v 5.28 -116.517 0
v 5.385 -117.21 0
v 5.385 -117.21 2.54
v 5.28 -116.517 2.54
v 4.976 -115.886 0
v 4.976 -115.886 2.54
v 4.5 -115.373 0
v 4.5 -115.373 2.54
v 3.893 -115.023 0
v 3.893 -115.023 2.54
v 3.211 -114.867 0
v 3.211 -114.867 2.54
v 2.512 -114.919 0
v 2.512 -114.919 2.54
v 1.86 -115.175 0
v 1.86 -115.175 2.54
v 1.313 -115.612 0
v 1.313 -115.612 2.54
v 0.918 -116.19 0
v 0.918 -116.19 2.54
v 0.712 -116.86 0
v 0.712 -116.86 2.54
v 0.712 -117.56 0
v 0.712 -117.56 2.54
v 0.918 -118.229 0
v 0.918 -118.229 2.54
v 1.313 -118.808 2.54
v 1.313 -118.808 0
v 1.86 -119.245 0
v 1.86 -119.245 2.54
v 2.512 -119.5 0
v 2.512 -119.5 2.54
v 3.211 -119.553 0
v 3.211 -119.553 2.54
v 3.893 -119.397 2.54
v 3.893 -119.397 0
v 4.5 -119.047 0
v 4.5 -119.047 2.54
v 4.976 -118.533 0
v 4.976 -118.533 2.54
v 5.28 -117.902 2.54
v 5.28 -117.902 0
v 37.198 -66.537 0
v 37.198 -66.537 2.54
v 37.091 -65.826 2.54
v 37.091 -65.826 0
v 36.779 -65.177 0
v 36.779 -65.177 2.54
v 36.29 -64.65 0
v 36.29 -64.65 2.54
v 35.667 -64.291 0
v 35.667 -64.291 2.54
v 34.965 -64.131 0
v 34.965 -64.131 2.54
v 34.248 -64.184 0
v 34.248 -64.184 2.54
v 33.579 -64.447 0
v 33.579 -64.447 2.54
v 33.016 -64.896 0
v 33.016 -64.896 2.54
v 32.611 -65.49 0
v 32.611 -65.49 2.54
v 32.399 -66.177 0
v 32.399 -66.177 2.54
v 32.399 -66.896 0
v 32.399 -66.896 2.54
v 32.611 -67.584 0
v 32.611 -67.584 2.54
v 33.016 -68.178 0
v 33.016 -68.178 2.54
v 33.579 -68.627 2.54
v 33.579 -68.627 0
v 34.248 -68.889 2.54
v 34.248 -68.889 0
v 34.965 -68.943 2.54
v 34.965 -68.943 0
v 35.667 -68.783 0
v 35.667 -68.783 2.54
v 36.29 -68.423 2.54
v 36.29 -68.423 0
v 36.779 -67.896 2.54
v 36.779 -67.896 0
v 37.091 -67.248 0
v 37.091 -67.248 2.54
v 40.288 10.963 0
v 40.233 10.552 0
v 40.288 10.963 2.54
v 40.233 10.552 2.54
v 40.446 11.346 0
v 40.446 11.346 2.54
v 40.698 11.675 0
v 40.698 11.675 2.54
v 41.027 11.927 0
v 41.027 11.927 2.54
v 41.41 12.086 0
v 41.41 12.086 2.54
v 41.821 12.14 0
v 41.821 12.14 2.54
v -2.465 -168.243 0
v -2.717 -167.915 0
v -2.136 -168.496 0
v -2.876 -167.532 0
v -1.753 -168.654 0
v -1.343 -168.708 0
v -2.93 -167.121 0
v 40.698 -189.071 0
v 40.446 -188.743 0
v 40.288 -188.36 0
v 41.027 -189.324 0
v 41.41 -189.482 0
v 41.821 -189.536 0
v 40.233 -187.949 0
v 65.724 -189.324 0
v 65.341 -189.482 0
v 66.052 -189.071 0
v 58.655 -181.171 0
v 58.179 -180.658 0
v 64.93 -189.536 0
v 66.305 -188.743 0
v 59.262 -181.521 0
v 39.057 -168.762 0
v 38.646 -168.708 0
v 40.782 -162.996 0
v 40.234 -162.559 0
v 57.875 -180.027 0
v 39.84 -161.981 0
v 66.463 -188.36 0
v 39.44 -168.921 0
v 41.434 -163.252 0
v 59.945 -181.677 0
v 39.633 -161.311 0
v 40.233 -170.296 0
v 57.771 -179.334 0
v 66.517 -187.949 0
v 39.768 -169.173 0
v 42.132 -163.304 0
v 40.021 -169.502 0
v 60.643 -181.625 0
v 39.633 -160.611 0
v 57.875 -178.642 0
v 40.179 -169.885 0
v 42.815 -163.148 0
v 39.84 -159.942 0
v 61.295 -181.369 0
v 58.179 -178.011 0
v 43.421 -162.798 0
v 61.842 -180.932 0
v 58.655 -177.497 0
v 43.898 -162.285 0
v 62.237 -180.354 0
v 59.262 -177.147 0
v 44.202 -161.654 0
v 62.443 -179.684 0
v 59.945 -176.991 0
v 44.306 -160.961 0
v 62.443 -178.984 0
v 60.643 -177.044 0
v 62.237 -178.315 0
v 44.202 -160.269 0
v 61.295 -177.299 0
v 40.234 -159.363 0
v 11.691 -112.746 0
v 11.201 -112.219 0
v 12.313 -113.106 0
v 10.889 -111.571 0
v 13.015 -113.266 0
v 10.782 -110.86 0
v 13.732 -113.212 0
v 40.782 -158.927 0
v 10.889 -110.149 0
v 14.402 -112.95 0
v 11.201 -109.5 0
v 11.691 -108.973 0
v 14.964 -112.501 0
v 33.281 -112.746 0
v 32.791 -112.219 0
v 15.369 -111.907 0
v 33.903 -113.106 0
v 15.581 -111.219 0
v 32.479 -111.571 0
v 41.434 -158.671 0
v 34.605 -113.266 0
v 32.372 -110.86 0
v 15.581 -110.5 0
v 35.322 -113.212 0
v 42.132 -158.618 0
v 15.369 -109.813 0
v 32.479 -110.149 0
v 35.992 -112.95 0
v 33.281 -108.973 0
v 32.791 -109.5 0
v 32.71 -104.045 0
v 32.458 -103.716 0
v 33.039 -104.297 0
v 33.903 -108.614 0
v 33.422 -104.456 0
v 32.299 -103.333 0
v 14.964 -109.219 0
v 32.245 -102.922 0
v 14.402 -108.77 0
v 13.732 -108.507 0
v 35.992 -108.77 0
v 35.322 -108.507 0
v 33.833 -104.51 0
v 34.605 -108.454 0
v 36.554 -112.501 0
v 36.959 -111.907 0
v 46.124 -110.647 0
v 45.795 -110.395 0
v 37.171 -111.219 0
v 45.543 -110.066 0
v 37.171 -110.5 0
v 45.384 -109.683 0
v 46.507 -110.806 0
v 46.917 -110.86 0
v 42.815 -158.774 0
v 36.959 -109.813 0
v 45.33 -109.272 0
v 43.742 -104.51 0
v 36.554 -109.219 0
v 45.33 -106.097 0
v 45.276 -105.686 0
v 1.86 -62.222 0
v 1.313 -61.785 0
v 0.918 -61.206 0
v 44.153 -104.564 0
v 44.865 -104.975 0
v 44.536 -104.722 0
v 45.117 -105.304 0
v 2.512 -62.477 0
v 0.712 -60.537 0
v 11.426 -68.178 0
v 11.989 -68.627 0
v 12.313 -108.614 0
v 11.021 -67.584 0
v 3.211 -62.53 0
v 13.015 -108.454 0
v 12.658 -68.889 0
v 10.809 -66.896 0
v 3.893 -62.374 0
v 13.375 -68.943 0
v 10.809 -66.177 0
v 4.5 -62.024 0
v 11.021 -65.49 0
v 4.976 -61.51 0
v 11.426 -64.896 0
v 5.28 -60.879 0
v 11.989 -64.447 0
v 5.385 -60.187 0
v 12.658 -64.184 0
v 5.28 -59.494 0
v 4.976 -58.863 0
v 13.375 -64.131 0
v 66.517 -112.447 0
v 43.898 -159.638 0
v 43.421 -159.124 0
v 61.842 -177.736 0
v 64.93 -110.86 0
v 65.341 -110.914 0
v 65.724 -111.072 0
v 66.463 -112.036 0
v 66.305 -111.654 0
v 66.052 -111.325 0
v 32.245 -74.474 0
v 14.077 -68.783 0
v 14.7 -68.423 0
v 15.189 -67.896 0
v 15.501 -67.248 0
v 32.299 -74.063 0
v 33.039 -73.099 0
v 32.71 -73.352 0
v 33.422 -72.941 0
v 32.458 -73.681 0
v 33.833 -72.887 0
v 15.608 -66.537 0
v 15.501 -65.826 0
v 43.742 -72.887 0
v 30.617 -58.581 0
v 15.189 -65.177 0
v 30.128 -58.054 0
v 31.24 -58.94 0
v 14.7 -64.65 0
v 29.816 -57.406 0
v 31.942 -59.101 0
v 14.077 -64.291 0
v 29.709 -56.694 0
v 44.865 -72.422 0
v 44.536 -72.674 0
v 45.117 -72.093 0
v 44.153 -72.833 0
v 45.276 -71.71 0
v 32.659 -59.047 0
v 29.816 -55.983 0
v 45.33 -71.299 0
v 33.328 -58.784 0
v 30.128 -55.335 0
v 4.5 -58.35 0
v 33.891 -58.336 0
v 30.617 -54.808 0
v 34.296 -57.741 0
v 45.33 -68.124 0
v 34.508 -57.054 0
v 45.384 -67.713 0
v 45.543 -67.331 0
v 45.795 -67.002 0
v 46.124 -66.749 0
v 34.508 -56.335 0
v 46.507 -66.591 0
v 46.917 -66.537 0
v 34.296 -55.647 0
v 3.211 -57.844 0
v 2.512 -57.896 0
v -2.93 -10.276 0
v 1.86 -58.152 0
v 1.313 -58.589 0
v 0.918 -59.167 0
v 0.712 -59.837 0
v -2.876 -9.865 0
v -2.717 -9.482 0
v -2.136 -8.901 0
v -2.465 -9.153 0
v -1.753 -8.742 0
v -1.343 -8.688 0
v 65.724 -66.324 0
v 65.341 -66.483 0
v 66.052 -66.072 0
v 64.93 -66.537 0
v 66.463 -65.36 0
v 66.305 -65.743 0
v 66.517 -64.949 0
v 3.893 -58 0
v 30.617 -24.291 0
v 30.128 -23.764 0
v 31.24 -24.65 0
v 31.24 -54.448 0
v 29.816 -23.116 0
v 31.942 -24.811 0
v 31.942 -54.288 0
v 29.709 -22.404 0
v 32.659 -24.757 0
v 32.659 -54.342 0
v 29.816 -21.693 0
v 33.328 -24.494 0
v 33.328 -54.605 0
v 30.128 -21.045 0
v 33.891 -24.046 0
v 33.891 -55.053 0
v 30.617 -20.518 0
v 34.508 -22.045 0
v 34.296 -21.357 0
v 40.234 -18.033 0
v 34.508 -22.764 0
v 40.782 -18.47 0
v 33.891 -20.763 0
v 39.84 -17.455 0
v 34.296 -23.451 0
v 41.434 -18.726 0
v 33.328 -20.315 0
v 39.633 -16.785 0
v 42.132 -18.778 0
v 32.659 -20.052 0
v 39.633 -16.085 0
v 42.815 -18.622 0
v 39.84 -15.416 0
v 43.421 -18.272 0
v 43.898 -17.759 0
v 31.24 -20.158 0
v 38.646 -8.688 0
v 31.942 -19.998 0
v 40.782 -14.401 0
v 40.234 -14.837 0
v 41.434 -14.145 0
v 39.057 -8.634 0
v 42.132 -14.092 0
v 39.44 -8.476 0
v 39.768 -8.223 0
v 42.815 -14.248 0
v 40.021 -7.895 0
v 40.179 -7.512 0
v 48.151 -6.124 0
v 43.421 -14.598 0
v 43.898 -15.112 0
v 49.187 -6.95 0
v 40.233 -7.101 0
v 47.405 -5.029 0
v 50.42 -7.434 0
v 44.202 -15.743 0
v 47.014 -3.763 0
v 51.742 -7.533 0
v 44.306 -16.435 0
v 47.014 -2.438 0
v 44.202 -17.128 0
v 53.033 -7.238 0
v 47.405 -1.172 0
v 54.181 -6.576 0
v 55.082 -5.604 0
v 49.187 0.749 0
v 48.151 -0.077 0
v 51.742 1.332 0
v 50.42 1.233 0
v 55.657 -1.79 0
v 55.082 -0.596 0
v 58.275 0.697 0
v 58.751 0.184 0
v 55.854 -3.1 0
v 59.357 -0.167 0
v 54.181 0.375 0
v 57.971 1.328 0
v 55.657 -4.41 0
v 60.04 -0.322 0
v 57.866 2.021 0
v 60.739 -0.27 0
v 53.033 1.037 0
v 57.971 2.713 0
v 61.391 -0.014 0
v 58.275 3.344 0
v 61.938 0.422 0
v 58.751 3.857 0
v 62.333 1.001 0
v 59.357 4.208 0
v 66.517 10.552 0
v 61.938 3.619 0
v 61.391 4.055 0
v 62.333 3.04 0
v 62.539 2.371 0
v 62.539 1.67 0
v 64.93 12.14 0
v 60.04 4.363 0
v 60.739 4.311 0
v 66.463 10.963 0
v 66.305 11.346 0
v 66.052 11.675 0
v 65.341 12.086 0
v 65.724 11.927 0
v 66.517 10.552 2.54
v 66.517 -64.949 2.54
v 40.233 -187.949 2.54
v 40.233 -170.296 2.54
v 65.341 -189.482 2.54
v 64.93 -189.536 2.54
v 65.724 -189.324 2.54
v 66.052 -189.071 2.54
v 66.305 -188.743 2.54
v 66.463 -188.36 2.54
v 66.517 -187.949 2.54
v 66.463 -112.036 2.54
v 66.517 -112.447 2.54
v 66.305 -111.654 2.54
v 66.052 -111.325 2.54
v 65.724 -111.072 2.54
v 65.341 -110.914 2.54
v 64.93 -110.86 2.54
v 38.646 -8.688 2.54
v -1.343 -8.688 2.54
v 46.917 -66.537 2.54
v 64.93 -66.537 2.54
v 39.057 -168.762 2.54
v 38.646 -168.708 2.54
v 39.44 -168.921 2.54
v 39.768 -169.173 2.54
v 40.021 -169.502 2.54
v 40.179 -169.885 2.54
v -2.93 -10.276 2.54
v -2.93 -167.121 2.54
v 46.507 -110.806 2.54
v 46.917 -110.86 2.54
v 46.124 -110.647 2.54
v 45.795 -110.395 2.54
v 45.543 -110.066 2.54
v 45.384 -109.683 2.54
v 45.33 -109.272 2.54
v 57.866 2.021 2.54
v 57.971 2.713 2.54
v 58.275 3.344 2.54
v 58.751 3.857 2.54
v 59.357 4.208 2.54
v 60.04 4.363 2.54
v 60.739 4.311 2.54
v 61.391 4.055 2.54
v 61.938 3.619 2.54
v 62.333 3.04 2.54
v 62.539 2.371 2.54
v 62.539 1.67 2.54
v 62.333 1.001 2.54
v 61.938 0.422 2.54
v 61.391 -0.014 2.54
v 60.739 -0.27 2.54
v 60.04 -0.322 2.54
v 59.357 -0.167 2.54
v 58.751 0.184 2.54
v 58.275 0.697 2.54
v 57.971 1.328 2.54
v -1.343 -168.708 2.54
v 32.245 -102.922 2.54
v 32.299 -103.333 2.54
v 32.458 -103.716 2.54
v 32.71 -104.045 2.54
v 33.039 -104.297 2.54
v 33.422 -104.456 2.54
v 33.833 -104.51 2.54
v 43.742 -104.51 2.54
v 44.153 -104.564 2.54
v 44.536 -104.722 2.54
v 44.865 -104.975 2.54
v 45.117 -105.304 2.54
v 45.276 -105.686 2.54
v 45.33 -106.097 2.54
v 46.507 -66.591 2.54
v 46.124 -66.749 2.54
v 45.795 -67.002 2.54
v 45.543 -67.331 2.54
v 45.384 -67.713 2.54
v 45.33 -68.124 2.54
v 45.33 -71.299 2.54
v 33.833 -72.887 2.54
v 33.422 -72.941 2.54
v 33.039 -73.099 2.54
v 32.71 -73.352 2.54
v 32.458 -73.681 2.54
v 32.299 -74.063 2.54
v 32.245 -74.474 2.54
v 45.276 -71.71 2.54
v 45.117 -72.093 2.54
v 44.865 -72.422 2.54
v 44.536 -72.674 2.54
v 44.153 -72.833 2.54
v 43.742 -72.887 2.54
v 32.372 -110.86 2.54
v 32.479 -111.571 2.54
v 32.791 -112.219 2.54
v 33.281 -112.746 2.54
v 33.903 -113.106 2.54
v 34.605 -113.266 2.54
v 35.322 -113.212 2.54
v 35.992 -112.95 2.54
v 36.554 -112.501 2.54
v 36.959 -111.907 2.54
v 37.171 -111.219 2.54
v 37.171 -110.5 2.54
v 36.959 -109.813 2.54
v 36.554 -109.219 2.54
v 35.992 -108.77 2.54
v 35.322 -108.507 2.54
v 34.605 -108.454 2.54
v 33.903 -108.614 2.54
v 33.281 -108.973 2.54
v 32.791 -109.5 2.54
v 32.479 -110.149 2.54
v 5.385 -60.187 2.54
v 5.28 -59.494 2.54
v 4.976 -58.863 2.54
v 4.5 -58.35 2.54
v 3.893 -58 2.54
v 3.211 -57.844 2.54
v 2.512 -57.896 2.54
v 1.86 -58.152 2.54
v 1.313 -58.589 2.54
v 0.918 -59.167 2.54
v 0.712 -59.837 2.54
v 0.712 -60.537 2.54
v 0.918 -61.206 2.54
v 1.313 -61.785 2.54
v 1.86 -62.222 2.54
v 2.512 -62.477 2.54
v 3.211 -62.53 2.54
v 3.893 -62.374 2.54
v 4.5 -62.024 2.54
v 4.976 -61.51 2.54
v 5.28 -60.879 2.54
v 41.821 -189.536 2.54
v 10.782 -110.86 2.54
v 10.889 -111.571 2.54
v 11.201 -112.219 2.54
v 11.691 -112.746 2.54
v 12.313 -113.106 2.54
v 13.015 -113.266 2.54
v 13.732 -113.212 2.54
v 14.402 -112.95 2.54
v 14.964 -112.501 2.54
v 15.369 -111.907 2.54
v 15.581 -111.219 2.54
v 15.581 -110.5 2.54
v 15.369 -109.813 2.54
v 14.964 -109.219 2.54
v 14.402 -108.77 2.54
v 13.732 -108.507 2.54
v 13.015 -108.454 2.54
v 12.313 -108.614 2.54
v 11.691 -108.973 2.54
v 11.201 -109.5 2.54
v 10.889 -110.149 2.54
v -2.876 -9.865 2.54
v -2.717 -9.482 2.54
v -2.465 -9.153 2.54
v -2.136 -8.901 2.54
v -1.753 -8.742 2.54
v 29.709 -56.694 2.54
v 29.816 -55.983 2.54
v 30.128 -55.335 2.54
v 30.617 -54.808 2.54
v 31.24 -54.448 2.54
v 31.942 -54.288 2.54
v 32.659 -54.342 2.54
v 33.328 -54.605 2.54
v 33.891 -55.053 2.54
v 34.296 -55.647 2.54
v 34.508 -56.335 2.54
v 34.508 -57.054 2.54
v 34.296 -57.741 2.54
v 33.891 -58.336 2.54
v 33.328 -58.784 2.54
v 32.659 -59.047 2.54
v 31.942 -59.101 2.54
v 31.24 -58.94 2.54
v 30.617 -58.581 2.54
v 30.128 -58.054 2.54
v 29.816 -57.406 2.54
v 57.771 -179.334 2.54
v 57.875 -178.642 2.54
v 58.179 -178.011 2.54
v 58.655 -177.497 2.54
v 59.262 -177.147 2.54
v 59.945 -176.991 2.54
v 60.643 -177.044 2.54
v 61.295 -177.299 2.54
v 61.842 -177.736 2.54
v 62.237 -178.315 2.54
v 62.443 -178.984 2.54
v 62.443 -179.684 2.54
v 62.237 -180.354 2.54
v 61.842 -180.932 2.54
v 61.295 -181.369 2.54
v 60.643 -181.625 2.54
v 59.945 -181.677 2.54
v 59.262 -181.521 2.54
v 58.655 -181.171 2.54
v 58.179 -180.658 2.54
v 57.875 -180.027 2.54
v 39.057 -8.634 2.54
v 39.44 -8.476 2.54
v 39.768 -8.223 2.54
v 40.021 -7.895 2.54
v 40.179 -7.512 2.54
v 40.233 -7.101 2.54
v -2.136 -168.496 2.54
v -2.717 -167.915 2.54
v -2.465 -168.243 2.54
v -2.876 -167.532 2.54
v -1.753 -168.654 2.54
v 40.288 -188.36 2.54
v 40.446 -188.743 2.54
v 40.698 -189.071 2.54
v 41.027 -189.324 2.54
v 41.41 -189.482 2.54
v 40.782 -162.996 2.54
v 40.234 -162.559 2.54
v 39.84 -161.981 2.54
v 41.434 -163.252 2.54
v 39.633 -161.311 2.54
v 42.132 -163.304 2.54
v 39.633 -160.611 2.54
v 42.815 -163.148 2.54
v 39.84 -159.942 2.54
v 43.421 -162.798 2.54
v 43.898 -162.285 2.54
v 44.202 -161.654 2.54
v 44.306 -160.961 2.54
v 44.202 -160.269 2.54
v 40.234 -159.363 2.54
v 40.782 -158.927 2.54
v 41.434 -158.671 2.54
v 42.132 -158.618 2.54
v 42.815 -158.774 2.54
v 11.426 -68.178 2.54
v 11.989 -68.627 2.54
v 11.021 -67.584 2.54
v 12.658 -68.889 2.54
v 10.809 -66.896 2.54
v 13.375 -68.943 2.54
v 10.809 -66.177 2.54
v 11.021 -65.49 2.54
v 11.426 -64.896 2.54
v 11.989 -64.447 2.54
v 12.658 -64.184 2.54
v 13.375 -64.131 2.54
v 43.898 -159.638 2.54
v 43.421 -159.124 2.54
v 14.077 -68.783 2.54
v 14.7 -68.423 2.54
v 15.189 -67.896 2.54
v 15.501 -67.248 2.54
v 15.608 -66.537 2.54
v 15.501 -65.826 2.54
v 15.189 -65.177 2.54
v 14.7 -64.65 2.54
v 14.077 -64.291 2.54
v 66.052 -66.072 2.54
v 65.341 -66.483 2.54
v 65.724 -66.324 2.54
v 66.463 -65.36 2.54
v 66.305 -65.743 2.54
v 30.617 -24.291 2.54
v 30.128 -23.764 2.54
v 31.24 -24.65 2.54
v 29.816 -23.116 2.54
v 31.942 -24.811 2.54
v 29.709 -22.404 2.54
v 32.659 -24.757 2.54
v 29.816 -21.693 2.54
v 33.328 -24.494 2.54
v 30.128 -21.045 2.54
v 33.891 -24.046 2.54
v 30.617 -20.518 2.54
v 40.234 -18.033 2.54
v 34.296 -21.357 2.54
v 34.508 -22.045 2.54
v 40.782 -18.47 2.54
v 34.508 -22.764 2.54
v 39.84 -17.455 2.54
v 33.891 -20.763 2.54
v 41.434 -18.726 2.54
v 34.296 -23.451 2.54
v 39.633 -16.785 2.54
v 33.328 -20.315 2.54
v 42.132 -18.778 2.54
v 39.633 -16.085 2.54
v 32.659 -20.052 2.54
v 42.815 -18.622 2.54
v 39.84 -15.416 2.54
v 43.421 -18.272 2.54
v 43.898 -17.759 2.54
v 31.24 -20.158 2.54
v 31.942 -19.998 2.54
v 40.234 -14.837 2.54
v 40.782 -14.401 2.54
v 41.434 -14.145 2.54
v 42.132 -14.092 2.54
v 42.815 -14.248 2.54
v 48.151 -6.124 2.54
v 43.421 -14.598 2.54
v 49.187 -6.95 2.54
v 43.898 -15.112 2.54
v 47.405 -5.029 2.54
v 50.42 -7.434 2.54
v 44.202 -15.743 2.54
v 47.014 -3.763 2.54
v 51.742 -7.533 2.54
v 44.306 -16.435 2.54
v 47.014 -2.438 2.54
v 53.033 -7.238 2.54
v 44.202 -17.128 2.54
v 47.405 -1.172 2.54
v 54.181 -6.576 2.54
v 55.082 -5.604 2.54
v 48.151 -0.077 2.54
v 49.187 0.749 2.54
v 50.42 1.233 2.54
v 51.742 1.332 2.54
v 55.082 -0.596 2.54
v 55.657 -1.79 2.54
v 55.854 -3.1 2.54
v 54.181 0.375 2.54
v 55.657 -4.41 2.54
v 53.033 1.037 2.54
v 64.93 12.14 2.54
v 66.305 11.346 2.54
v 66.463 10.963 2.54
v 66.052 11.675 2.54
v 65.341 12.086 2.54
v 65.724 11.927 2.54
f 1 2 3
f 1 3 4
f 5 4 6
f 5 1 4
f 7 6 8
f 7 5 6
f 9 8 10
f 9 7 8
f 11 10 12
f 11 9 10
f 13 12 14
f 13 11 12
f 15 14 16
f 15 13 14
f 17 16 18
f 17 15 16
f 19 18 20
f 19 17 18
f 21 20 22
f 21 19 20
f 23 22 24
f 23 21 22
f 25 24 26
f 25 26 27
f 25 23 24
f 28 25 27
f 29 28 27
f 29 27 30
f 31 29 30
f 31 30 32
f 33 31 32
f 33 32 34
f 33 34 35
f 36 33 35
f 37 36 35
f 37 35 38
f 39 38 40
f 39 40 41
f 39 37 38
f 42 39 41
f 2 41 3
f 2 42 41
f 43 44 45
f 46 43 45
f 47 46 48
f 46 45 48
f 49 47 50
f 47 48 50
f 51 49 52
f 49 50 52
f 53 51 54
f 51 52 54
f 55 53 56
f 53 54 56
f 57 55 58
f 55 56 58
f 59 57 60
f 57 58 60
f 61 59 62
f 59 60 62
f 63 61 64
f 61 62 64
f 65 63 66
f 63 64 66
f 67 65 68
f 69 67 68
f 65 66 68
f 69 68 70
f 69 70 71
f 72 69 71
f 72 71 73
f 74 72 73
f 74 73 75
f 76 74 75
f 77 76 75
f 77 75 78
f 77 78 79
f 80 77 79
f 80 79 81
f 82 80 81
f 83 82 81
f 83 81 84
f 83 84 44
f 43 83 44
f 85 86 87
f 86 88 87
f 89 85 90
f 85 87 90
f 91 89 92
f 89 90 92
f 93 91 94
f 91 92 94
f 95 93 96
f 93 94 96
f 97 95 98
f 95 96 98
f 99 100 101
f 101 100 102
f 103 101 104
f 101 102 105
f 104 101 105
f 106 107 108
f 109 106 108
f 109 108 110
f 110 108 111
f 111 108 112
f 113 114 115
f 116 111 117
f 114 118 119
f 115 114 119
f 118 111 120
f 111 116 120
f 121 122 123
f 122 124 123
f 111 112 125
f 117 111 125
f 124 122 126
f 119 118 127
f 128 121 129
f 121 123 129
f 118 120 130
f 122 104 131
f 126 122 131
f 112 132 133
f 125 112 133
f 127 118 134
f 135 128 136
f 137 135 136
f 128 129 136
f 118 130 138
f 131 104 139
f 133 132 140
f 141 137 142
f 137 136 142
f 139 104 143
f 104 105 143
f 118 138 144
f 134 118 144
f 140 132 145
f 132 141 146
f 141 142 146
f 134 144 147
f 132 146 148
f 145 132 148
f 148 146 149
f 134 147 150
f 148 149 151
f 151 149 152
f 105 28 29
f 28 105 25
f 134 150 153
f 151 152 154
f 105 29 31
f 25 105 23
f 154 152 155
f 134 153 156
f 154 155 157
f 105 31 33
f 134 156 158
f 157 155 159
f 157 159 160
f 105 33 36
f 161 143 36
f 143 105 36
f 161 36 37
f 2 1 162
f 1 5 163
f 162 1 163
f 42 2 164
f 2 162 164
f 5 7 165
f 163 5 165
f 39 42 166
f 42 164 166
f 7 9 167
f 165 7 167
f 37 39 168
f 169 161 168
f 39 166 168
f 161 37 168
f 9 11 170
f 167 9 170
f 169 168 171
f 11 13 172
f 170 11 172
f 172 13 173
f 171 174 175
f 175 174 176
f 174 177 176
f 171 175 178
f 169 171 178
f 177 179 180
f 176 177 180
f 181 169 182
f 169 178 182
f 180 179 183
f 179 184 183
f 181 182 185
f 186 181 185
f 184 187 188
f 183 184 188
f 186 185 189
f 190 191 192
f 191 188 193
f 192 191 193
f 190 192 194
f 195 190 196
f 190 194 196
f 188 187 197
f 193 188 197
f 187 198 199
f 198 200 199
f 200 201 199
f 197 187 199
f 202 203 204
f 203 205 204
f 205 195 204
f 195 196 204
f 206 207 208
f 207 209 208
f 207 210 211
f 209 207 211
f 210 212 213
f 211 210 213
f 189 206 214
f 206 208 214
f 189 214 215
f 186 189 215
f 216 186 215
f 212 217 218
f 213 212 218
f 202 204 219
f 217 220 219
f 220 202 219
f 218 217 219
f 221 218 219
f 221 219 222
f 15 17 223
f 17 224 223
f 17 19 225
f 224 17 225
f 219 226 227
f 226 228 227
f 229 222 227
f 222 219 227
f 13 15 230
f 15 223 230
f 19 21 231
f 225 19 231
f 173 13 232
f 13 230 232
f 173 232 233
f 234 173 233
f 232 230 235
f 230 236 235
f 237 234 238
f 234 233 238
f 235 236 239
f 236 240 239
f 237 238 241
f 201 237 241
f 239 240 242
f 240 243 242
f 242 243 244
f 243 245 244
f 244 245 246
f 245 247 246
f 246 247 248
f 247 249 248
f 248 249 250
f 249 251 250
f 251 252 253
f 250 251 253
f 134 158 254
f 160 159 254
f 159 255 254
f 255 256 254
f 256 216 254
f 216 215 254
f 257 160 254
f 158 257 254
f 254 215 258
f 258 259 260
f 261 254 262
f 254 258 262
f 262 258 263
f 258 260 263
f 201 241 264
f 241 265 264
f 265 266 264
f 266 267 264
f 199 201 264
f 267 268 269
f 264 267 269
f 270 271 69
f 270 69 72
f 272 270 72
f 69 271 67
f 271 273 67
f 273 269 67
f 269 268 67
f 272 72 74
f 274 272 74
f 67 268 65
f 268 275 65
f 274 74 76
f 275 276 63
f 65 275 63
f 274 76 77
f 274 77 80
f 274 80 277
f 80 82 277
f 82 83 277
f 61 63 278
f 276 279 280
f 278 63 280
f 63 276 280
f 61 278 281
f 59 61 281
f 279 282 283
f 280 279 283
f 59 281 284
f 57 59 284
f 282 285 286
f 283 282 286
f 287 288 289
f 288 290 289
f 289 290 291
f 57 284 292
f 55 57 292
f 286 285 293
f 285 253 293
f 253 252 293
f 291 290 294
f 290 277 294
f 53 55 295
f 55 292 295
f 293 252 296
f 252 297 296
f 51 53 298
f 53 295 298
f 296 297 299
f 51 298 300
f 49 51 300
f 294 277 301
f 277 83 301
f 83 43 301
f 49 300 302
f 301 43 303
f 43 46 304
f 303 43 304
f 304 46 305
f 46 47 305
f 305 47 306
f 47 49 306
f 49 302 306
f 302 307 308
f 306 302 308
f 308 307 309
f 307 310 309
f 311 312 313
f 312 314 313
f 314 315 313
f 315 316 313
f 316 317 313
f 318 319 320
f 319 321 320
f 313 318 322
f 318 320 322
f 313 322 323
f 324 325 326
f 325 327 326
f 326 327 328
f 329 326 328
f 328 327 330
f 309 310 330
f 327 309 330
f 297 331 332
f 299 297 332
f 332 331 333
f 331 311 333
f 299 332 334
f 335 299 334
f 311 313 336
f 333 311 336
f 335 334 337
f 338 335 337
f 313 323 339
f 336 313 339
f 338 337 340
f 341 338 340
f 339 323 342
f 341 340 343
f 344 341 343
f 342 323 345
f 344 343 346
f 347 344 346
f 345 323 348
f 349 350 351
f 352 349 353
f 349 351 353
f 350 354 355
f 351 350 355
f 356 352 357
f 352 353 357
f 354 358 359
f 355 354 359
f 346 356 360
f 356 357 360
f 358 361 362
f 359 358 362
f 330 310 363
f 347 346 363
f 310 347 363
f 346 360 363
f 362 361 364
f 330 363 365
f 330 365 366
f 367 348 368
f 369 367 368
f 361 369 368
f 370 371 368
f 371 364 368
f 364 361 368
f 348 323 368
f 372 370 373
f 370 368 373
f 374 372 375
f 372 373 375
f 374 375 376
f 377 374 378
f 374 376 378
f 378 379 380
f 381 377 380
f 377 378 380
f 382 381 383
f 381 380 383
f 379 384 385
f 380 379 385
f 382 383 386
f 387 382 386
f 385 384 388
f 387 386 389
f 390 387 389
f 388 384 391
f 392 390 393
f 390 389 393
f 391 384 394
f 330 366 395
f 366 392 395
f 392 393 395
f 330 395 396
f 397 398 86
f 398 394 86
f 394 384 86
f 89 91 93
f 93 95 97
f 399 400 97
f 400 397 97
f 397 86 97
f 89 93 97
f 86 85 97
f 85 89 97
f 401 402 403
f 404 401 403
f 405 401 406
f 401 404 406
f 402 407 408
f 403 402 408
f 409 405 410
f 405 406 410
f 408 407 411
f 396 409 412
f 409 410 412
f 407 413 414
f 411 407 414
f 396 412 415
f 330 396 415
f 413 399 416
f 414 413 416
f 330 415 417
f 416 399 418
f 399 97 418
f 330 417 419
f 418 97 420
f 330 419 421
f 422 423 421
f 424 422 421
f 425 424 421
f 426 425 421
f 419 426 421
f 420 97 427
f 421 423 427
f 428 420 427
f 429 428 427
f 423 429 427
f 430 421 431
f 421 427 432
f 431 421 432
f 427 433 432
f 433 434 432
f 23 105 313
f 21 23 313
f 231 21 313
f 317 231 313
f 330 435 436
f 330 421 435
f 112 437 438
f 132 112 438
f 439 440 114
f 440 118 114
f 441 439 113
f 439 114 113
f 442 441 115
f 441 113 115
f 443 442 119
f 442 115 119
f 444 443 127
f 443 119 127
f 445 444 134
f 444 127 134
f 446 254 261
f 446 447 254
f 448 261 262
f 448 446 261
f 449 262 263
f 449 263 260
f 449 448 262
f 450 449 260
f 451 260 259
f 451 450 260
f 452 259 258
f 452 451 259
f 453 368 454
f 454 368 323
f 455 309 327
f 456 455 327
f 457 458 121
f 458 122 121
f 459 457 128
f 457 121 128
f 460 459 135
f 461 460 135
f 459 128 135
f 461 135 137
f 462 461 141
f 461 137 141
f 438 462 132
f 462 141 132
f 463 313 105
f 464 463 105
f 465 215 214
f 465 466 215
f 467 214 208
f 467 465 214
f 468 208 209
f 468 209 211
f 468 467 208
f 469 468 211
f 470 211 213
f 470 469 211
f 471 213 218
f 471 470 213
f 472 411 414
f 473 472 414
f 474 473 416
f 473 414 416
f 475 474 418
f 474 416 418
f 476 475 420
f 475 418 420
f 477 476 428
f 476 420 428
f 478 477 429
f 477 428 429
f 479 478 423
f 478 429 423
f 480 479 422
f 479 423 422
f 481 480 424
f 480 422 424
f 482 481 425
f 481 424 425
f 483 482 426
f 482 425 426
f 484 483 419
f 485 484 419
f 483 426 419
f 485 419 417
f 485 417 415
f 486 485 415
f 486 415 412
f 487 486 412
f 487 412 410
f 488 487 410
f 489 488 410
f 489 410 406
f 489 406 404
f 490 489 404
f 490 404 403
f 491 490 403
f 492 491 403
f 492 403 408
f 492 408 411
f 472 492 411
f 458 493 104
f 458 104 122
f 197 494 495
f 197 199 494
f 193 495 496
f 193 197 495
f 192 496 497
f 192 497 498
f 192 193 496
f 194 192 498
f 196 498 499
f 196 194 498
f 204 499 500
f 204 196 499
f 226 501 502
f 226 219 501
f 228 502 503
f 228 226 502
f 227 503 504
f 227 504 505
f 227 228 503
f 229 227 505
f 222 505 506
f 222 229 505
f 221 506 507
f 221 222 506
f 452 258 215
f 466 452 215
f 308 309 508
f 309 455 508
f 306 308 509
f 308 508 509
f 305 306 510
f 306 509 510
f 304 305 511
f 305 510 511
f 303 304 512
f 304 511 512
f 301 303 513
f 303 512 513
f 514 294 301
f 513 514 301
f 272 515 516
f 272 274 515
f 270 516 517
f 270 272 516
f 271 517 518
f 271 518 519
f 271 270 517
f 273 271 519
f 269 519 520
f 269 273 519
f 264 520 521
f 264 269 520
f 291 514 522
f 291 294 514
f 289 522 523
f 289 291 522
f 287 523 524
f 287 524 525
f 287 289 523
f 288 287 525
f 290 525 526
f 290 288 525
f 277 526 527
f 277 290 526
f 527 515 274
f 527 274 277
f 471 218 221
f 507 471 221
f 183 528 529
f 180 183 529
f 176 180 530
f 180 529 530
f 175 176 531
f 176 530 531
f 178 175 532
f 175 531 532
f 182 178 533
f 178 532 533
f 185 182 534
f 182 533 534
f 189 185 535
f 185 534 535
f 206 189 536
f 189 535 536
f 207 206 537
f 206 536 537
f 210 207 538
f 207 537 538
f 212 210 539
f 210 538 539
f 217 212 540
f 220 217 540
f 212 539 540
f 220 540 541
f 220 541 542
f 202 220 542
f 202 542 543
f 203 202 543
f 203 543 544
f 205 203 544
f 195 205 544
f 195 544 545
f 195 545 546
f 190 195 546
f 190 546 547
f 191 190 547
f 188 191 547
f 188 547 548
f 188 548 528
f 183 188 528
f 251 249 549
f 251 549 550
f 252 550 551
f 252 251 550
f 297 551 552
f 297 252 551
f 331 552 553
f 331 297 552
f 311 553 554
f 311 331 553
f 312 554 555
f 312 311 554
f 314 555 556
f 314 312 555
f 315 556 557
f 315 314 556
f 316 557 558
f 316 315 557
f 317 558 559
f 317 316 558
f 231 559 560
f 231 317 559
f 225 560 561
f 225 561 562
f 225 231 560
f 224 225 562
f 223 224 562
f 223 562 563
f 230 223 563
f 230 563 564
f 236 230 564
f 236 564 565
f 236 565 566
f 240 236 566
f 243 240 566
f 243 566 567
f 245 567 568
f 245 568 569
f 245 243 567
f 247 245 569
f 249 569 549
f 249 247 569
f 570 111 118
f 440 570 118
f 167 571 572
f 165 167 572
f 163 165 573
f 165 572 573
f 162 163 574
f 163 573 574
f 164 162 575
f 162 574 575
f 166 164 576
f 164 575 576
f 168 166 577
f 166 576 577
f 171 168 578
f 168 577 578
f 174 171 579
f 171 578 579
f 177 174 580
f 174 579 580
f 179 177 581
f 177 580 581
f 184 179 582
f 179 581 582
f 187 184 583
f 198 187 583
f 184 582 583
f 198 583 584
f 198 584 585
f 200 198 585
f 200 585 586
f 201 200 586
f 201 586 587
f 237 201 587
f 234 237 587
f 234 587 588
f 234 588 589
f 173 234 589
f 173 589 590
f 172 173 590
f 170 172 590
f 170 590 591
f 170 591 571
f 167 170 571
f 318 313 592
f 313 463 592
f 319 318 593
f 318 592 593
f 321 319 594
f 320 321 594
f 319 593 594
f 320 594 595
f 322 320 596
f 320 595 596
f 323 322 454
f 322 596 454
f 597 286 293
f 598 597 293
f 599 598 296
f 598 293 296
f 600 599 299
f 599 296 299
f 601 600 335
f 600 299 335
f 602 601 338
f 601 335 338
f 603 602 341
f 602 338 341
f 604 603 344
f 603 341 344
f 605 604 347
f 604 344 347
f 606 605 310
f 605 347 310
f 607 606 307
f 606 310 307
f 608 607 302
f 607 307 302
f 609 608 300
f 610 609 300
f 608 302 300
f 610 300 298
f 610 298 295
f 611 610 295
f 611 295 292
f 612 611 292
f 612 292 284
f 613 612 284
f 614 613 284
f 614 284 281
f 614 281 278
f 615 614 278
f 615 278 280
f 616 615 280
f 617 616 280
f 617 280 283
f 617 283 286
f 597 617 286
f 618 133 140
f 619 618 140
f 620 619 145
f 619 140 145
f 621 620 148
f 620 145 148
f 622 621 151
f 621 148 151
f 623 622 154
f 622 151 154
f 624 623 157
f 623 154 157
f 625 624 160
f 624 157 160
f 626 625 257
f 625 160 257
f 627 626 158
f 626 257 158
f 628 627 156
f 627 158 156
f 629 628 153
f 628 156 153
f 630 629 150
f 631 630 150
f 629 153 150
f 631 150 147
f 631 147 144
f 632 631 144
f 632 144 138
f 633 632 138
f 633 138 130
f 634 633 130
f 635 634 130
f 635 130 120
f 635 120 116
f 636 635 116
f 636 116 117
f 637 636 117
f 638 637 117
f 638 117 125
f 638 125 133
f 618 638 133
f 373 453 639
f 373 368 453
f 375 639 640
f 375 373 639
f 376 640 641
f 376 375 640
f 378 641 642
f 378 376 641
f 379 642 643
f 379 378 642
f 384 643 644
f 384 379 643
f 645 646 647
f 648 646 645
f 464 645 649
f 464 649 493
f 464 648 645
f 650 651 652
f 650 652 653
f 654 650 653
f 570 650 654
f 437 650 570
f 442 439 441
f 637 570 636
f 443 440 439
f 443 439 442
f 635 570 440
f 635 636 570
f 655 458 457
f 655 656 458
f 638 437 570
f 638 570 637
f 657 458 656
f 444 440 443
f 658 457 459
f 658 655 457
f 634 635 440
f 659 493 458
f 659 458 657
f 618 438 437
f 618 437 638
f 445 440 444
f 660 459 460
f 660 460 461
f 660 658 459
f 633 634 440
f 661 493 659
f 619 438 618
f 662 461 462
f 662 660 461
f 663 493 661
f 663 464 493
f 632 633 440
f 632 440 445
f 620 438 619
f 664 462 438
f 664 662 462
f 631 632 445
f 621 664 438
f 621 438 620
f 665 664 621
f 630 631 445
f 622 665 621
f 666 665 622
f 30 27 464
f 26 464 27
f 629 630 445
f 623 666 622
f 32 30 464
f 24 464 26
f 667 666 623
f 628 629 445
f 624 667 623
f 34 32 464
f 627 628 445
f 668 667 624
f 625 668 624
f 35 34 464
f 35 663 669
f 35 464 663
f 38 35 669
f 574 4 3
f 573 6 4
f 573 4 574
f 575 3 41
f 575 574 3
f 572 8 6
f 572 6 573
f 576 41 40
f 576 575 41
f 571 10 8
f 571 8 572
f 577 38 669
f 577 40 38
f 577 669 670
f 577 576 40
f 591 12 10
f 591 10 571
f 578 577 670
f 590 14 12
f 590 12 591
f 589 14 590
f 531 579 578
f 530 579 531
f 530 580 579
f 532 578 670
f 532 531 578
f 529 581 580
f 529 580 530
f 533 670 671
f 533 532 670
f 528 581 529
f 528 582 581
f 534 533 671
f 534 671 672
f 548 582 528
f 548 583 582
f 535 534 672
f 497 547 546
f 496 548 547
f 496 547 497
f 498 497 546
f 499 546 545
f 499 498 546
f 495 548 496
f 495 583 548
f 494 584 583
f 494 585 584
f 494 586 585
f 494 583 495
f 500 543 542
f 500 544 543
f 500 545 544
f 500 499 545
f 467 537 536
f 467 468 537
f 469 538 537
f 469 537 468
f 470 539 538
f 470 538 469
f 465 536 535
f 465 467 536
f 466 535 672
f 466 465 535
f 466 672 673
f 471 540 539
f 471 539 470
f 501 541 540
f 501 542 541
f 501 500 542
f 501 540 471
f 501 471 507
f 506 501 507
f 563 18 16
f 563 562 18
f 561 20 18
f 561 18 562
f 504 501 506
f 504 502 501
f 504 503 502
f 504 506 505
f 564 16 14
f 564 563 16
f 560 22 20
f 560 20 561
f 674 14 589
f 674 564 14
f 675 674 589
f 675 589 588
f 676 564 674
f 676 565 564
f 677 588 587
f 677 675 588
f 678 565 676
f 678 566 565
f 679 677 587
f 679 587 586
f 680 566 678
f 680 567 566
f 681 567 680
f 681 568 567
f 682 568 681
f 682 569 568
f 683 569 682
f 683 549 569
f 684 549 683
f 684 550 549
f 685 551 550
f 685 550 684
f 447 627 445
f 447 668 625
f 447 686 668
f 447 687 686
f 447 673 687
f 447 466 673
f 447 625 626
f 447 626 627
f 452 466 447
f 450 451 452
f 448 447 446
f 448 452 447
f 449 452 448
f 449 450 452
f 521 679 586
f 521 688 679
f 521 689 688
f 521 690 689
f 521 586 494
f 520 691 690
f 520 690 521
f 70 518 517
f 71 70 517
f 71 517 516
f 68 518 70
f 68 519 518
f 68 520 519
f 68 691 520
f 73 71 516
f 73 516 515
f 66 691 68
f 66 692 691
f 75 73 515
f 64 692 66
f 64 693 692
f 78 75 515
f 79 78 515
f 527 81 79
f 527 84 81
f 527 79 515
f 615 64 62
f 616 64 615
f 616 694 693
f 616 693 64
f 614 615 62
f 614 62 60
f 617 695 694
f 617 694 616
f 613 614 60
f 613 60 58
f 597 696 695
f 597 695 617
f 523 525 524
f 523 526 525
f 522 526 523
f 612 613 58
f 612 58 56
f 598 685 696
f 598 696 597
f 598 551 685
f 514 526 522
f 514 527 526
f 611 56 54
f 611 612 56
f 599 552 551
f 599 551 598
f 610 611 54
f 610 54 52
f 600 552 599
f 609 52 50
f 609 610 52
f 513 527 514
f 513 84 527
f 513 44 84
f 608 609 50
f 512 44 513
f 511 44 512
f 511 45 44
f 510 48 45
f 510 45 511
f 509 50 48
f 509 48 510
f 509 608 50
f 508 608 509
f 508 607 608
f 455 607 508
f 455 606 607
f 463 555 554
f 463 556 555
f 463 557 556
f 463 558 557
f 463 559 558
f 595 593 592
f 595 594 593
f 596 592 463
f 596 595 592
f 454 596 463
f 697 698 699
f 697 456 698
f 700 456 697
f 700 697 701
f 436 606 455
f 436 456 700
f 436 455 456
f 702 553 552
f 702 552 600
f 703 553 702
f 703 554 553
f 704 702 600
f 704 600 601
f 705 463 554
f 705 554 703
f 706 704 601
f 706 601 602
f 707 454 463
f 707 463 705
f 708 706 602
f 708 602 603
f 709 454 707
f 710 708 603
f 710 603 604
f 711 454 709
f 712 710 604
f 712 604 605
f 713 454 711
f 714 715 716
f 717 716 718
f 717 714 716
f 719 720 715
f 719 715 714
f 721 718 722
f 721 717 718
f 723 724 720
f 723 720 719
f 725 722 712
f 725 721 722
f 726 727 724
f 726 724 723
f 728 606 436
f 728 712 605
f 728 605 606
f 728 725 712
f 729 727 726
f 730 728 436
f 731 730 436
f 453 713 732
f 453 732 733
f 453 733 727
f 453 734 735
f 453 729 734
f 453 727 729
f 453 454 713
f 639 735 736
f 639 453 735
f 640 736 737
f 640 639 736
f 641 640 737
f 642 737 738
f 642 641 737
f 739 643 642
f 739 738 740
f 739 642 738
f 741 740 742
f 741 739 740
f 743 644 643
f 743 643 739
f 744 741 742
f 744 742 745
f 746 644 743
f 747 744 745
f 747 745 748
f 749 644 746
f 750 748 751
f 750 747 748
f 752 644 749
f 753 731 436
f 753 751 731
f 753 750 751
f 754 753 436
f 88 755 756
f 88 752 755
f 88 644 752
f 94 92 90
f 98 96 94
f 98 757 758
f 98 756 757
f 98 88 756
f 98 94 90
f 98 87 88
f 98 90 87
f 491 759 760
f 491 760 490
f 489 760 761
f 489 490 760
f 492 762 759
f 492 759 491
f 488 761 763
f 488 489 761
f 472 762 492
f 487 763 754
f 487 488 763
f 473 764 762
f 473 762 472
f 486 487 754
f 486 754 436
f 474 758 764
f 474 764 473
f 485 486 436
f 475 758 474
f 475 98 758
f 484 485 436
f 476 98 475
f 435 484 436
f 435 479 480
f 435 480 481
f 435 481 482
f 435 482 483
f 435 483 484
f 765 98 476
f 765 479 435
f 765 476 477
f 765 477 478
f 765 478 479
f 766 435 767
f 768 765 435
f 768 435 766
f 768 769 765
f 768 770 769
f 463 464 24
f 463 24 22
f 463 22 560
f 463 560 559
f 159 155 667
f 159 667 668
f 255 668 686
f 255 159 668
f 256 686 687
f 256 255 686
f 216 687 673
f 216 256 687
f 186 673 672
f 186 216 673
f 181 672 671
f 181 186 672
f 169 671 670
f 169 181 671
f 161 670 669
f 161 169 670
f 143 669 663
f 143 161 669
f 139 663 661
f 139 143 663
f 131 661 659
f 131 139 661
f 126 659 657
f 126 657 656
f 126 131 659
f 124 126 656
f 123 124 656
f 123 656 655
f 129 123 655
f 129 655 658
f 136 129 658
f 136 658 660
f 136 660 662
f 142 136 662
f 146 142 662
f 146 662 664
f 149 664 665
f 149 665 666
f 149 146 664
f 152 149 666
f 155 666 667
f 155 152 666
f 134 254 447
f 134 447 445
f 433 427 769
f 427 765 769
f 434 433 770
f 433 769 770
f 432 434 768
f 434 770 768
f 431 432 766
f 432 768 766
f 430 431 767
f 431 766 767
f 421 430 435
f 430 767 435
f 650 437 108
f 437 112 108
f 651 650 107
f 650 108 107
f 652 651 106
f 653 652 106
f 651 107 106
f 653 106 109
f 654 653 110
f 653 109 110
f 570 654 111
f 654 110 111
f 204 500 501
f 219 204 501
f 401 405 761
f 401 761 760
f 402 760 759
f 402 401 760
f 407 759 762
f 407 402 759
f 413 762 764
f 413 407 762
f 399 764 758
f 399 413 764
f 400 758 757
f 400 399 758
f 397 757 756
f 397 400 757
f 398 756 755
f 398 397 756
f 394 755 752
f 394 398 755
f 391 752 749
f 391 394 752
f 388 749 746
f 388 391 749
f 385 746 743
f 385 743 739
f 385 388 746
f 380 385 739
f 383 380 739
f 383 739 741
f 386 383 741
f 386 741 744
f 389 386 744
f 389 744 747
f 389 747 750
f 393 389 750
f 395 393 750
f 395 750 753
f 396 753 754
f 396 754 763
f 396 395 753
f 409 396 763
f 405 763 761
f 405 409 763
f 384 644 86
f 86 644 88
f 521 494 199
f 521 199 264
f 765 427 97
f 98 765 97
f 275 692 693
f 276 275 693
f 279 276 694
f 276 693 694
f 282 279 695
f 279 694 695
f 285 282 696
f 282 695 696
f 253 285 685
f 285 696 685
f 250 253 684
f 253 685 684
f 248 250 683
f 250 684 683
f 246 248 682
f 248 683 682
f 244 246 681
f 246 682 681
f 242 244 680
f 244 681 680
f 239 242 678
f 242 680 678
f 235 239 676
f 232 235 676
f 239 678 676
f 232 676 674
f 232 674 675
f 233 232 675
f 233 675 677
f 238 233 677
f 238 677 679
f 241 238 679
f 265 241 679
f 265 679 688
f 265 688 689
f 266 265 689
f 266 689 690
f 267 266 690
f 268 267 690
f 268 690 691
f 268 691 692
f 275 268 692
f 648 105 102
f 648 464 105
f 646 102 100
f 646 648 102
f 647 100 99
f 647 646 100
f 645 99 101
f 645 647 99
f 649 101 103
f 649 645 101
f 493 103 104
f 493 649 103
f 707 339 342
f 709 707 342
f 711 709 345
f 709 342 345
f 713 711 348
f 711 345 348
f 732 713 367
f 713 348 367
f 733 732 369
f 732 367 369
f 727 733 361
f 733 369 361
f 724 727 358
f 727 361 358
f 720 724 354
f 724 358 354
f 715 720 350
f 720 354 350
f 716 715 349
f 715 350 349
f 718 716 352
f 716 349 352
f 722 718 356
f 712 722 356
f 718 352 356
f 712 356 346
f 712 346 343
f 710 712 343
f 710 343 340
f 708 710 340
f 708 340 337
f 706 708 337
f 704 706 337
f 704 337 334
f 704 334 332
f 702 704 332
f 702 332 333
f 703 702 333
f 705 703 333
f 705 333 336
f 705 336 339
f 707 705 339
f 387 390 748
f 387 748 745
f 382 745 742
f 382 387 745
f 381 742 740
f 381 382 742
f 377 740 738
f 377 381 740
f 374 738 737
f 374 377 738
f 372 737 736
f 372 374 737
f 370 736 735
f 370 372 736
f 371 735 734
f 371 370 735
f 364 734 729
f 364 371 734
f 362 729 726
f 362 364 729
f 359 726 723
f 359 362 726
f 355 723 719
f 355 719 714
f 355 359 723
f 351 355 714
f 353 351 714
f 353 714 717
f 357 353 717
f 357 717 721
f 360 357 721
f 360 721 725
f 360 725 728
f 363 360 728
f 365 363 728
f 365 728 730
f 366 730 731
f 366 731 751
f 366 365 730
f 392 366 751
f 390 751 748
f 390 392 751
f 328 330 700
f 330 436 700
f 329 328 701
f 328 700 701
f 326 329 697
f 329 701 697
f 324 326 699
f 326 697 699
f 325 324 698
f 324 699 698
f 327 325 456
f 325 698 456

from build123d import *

# Parameters (mm, degrees)
SKETCH1_R               = 2.3495
SKETCH1_R_2             = 4.445
BOSS_EXTRUDE1_DEPTH     = 2.54
SKETCH2_R               = 2.413
CUT_EXTRUDE1_DEPTH      = 217.884748371
SKETCH3_W               = 13.08488816
SKETCH3_H               = 31.623
CUT_EXTRUDE2_DEPTH      = 217.884748371
SKETCH4_W               = 12.77569874
SKETCH4_H               = 24.435209008
SKETCH4_W_2             = 40.233428475
SKETCH4_H_2             = 28.333759116
CUT_EXTRUDE3_DEPTH      = 217.884748371
SKETCH5_R               = 2.413
CUT_EXTRUDE4_DEPTH      = 217.884748371
CUT_EXTRUDE5_DEPTH      = 217.884748371
CUT_EXTRUDE5_DEPTH_BACK = 217.884748371
SKETCH8_R               = 2.3495
CUT_EXTRUDE6_DEPTH      = 191.226610272
FILLET1_R               = 1.5875
SKETCH9_W               = 0.38488816
SKETCH9_H               = 2.54
CUT_EXTRUDE7_DEPTH      = 152.146866512


with BuildPart() as part:
    # Sketch1 → Boss-Extrude1 (new body)
    with BuildSketch(Plane.XY):
        Polygon((-2.930050059, -104.509781075), (-3.314938219, -104.509781075), (-3.314938219, -110.859781075), (-3.314938219, -123.559781075), (-2.930050059, -123.559781075), (-2.930050059, -168.708281075), (38.709428475, -168.708281075), (38.709428475, -189.536281075), (105.397061781, -189.536281075), (66.517436481, -110.859781075), (45.329949941, -110.859781075), (45.329949941, -104.509781075), (45.329949941, -72.886781075), (45.329949941, -66.536781075), (66.517436481, -66.536781075), (105.397061781, 12.139718925), (38.709428475, 12.139718925), (38.709428475, -8.688281075), (-2.930050059, -8.688281075), (-2.930050059, -53.836781075), (-3.314938219, -53.836781075), (-3.314938219, -66.536781075), (-3.314938219, -72.886781075), (-2.930050059, -72.886781075), align=None)
        with Locations((90.673911143, 2.614718925)):
            Circle(SKETCH1_R, mode=Mode.SUBTRACT)
        with Locations((41.95655448, -16.435281075)):
            Circle(SKETCH1_R, mode=Mode.SUBTRACT)
        with Locations((3.035061781, -60.186781075)):
            Circle(SKETCH1_R, mode=Mode.SUBTRACT)
        with Locations((3.035061781, -117.209781075)):
            Circle(SKETCH1_R, mode=Mode.SUBTRACT)
        with Locations((41.95655448, -160.961281075)):
            Circle(SKETCH1_R, mode=Mode.SUBTRACT)
        with Locations((90.673911143, -180.011281075)):
            Circle(SKETCH1_R, mode=Mode.SUBTRACT)
        with Locations((51.409428475, -3.100281075)):
            Circle(SKETCH1_R_2, mode=Mode.SUBTRACT)
    extrude(amount=BOSS_EXTRUDE1_DEPTH)

    # Sketch2 → Cut-Extrude1 (cut, through all)
    with BuildSketch(Plane.XY.offset(2.54)):
        with Locations((13.195061781, -66.536781075)):
            Circle(SKETCH2_R)
        with Locations((34.785061781, -66.536781075)):
            Circle(SKETCH2_R)
        with Locations(Location((34.785061781, -110.859781075, 0), (0, 0, 180))):
            Circle(SKETCH2_R)
        with Locations(Location((13.195061781, -110.859781075, 0), (0, 0, 180))):
            Circle(SKETCH2_R)
    extrude(amount=-CUT_EXTRUDE1_DEPTH, mode=Mode.SUBTRACT)

    # Sketch3 → Cut-Extrude2 (cut, through all)
    with BuildSketch(Plane.XY.offset(2.54)):
        with Locations((38.787505861, -88.698281075)):
            Rectangle(SKETCH3_W, SKETCH3_H)
    extrude(amount=-CUT_EXTRUDE2_DEPTH, mode=Mode.SUBTRACT)

    # Sketch4 → Cut-Extrude3 (cut, through all)
    with BuildSketch(Plane.XY.offset(2.54)):
        with Locations((33.845579105, 3.529323429)):
            Rectangle(SKETCH4_W, SKETCH4_H)
        with Locations((20.116714238, -182.875160633)):
            Rectangle(SKETCH4_W_2, SKETCH4_H_2)
    extrude(amount=-CUT_EXTRUDE3_DEPTH, mode=Mode.SUBTRACT)

    # Sketch5 → Cut-Extrude4 (cut, through all)
    with BuildSketch(Plane(origin=(0, 0, 0), x_dir=(-1, 0, 0), z_dir=(0, 0, -1))):
        with Locations((-32.121949941, -22.404281075)):
            Circle(SKETCH5_R)
        with Locations((-32.121949941, -56.694281075)):
            Circle(SKETCH5_R)
    extrude(amount=-CUT_EXTRUDE4_DEPTH, mode=Mode.SUBTRACT)

    # Sketch7 → Cut-Extrude5 (cut, two sides: drawn at the far end of the back side and taken through both)
    with BuildSketch(Plane.XY.offset(2.54).offset(-CUT_EXTRUDE5_DEPTH_BACK)):
        Polygon((66.517436481, -66.536781075), (66.517436481, 21.52212206), (127.820808625, 21.52212206), (115.78217236, -200.256310461), (66.517436481, -200.256310461), (66.517436481, -110.859781075), align=None)
    extrude(amount=CUT_EXTRUDE5_DEPTH + CUT_EXTRUDE5_DEPTH_BACK, mode=Mode.SUBTRACT)

    # Sketch8 → Cut-Extrude6 (cut, through all)
    with BuildSketch(Plane(origin=(13.551580143, -170.546705634, 0), x_dir=(0.9999106684671756, -0.013366191885727564, 0), z_dir=(0, 0, -1))):
        with Locations(Location((44.353535624, -173.175566882, 0), (0, 0, 179.234150812))):
            Circle(SKETCH8_R)
        with Locations(Location((46.68181957, 8.1642617, 0), (0, 0, 179.234150812))):
            Circle(SKETCH8_R)
    extrude(amount=-CUT_EXTRUDE6_DEPTH, mode=Mode.SUBTRACT)

    # Fillet1
    fillet1_edges = [part.edges().sort_by_distance(p)[0] for p in [
        (45.329949941, -72.886781075, 1.27),
        (45.329949941, -104.509781075, 1.27),
        (32.245061781, -104.509781075, 1.27),
        (32.245061781, -72.886781075, 1.27),
        (40.233428475, -189.536281075, 1.27),
        (40.233428475, 12.139718925, 1.27),
        (40.233428475, -8.688281075, 1.27),
        (40.233428475, -168.708281075, 1.27),
        (66.517436481, 12.139718925, 1.27),
        (66.517436481, -189.536281075, 1.27),
        (45.329949941, -66.536781075, 1.27),
        (45.329949941, -110.859781075, 1.27),
        (66.517436481, -110.859781075, 1.27),
        (-2.930050059, -168.708281075, 1.27),
        (-2.930050059, -8.688281075, 1.27),
        (66.517436481, -66.536781075, 1.27),
    ]]
    fillet(fillet1_edges, radius=FILLET1_R)

    # Sketch9 → Cut-Extrude7 (cut, through all)
    with BuildSketch(Plane.XZ.offset(123.559781075)):
        with Locations((-3.122494139, 1.27)):
            Rectangle(SKETCH9_W, SKETCH9_H)
    extrude(amount=-CUT_EXTRUDE7_DEPTH, mode=Mode.SUBTRACT)


solid = part.part
